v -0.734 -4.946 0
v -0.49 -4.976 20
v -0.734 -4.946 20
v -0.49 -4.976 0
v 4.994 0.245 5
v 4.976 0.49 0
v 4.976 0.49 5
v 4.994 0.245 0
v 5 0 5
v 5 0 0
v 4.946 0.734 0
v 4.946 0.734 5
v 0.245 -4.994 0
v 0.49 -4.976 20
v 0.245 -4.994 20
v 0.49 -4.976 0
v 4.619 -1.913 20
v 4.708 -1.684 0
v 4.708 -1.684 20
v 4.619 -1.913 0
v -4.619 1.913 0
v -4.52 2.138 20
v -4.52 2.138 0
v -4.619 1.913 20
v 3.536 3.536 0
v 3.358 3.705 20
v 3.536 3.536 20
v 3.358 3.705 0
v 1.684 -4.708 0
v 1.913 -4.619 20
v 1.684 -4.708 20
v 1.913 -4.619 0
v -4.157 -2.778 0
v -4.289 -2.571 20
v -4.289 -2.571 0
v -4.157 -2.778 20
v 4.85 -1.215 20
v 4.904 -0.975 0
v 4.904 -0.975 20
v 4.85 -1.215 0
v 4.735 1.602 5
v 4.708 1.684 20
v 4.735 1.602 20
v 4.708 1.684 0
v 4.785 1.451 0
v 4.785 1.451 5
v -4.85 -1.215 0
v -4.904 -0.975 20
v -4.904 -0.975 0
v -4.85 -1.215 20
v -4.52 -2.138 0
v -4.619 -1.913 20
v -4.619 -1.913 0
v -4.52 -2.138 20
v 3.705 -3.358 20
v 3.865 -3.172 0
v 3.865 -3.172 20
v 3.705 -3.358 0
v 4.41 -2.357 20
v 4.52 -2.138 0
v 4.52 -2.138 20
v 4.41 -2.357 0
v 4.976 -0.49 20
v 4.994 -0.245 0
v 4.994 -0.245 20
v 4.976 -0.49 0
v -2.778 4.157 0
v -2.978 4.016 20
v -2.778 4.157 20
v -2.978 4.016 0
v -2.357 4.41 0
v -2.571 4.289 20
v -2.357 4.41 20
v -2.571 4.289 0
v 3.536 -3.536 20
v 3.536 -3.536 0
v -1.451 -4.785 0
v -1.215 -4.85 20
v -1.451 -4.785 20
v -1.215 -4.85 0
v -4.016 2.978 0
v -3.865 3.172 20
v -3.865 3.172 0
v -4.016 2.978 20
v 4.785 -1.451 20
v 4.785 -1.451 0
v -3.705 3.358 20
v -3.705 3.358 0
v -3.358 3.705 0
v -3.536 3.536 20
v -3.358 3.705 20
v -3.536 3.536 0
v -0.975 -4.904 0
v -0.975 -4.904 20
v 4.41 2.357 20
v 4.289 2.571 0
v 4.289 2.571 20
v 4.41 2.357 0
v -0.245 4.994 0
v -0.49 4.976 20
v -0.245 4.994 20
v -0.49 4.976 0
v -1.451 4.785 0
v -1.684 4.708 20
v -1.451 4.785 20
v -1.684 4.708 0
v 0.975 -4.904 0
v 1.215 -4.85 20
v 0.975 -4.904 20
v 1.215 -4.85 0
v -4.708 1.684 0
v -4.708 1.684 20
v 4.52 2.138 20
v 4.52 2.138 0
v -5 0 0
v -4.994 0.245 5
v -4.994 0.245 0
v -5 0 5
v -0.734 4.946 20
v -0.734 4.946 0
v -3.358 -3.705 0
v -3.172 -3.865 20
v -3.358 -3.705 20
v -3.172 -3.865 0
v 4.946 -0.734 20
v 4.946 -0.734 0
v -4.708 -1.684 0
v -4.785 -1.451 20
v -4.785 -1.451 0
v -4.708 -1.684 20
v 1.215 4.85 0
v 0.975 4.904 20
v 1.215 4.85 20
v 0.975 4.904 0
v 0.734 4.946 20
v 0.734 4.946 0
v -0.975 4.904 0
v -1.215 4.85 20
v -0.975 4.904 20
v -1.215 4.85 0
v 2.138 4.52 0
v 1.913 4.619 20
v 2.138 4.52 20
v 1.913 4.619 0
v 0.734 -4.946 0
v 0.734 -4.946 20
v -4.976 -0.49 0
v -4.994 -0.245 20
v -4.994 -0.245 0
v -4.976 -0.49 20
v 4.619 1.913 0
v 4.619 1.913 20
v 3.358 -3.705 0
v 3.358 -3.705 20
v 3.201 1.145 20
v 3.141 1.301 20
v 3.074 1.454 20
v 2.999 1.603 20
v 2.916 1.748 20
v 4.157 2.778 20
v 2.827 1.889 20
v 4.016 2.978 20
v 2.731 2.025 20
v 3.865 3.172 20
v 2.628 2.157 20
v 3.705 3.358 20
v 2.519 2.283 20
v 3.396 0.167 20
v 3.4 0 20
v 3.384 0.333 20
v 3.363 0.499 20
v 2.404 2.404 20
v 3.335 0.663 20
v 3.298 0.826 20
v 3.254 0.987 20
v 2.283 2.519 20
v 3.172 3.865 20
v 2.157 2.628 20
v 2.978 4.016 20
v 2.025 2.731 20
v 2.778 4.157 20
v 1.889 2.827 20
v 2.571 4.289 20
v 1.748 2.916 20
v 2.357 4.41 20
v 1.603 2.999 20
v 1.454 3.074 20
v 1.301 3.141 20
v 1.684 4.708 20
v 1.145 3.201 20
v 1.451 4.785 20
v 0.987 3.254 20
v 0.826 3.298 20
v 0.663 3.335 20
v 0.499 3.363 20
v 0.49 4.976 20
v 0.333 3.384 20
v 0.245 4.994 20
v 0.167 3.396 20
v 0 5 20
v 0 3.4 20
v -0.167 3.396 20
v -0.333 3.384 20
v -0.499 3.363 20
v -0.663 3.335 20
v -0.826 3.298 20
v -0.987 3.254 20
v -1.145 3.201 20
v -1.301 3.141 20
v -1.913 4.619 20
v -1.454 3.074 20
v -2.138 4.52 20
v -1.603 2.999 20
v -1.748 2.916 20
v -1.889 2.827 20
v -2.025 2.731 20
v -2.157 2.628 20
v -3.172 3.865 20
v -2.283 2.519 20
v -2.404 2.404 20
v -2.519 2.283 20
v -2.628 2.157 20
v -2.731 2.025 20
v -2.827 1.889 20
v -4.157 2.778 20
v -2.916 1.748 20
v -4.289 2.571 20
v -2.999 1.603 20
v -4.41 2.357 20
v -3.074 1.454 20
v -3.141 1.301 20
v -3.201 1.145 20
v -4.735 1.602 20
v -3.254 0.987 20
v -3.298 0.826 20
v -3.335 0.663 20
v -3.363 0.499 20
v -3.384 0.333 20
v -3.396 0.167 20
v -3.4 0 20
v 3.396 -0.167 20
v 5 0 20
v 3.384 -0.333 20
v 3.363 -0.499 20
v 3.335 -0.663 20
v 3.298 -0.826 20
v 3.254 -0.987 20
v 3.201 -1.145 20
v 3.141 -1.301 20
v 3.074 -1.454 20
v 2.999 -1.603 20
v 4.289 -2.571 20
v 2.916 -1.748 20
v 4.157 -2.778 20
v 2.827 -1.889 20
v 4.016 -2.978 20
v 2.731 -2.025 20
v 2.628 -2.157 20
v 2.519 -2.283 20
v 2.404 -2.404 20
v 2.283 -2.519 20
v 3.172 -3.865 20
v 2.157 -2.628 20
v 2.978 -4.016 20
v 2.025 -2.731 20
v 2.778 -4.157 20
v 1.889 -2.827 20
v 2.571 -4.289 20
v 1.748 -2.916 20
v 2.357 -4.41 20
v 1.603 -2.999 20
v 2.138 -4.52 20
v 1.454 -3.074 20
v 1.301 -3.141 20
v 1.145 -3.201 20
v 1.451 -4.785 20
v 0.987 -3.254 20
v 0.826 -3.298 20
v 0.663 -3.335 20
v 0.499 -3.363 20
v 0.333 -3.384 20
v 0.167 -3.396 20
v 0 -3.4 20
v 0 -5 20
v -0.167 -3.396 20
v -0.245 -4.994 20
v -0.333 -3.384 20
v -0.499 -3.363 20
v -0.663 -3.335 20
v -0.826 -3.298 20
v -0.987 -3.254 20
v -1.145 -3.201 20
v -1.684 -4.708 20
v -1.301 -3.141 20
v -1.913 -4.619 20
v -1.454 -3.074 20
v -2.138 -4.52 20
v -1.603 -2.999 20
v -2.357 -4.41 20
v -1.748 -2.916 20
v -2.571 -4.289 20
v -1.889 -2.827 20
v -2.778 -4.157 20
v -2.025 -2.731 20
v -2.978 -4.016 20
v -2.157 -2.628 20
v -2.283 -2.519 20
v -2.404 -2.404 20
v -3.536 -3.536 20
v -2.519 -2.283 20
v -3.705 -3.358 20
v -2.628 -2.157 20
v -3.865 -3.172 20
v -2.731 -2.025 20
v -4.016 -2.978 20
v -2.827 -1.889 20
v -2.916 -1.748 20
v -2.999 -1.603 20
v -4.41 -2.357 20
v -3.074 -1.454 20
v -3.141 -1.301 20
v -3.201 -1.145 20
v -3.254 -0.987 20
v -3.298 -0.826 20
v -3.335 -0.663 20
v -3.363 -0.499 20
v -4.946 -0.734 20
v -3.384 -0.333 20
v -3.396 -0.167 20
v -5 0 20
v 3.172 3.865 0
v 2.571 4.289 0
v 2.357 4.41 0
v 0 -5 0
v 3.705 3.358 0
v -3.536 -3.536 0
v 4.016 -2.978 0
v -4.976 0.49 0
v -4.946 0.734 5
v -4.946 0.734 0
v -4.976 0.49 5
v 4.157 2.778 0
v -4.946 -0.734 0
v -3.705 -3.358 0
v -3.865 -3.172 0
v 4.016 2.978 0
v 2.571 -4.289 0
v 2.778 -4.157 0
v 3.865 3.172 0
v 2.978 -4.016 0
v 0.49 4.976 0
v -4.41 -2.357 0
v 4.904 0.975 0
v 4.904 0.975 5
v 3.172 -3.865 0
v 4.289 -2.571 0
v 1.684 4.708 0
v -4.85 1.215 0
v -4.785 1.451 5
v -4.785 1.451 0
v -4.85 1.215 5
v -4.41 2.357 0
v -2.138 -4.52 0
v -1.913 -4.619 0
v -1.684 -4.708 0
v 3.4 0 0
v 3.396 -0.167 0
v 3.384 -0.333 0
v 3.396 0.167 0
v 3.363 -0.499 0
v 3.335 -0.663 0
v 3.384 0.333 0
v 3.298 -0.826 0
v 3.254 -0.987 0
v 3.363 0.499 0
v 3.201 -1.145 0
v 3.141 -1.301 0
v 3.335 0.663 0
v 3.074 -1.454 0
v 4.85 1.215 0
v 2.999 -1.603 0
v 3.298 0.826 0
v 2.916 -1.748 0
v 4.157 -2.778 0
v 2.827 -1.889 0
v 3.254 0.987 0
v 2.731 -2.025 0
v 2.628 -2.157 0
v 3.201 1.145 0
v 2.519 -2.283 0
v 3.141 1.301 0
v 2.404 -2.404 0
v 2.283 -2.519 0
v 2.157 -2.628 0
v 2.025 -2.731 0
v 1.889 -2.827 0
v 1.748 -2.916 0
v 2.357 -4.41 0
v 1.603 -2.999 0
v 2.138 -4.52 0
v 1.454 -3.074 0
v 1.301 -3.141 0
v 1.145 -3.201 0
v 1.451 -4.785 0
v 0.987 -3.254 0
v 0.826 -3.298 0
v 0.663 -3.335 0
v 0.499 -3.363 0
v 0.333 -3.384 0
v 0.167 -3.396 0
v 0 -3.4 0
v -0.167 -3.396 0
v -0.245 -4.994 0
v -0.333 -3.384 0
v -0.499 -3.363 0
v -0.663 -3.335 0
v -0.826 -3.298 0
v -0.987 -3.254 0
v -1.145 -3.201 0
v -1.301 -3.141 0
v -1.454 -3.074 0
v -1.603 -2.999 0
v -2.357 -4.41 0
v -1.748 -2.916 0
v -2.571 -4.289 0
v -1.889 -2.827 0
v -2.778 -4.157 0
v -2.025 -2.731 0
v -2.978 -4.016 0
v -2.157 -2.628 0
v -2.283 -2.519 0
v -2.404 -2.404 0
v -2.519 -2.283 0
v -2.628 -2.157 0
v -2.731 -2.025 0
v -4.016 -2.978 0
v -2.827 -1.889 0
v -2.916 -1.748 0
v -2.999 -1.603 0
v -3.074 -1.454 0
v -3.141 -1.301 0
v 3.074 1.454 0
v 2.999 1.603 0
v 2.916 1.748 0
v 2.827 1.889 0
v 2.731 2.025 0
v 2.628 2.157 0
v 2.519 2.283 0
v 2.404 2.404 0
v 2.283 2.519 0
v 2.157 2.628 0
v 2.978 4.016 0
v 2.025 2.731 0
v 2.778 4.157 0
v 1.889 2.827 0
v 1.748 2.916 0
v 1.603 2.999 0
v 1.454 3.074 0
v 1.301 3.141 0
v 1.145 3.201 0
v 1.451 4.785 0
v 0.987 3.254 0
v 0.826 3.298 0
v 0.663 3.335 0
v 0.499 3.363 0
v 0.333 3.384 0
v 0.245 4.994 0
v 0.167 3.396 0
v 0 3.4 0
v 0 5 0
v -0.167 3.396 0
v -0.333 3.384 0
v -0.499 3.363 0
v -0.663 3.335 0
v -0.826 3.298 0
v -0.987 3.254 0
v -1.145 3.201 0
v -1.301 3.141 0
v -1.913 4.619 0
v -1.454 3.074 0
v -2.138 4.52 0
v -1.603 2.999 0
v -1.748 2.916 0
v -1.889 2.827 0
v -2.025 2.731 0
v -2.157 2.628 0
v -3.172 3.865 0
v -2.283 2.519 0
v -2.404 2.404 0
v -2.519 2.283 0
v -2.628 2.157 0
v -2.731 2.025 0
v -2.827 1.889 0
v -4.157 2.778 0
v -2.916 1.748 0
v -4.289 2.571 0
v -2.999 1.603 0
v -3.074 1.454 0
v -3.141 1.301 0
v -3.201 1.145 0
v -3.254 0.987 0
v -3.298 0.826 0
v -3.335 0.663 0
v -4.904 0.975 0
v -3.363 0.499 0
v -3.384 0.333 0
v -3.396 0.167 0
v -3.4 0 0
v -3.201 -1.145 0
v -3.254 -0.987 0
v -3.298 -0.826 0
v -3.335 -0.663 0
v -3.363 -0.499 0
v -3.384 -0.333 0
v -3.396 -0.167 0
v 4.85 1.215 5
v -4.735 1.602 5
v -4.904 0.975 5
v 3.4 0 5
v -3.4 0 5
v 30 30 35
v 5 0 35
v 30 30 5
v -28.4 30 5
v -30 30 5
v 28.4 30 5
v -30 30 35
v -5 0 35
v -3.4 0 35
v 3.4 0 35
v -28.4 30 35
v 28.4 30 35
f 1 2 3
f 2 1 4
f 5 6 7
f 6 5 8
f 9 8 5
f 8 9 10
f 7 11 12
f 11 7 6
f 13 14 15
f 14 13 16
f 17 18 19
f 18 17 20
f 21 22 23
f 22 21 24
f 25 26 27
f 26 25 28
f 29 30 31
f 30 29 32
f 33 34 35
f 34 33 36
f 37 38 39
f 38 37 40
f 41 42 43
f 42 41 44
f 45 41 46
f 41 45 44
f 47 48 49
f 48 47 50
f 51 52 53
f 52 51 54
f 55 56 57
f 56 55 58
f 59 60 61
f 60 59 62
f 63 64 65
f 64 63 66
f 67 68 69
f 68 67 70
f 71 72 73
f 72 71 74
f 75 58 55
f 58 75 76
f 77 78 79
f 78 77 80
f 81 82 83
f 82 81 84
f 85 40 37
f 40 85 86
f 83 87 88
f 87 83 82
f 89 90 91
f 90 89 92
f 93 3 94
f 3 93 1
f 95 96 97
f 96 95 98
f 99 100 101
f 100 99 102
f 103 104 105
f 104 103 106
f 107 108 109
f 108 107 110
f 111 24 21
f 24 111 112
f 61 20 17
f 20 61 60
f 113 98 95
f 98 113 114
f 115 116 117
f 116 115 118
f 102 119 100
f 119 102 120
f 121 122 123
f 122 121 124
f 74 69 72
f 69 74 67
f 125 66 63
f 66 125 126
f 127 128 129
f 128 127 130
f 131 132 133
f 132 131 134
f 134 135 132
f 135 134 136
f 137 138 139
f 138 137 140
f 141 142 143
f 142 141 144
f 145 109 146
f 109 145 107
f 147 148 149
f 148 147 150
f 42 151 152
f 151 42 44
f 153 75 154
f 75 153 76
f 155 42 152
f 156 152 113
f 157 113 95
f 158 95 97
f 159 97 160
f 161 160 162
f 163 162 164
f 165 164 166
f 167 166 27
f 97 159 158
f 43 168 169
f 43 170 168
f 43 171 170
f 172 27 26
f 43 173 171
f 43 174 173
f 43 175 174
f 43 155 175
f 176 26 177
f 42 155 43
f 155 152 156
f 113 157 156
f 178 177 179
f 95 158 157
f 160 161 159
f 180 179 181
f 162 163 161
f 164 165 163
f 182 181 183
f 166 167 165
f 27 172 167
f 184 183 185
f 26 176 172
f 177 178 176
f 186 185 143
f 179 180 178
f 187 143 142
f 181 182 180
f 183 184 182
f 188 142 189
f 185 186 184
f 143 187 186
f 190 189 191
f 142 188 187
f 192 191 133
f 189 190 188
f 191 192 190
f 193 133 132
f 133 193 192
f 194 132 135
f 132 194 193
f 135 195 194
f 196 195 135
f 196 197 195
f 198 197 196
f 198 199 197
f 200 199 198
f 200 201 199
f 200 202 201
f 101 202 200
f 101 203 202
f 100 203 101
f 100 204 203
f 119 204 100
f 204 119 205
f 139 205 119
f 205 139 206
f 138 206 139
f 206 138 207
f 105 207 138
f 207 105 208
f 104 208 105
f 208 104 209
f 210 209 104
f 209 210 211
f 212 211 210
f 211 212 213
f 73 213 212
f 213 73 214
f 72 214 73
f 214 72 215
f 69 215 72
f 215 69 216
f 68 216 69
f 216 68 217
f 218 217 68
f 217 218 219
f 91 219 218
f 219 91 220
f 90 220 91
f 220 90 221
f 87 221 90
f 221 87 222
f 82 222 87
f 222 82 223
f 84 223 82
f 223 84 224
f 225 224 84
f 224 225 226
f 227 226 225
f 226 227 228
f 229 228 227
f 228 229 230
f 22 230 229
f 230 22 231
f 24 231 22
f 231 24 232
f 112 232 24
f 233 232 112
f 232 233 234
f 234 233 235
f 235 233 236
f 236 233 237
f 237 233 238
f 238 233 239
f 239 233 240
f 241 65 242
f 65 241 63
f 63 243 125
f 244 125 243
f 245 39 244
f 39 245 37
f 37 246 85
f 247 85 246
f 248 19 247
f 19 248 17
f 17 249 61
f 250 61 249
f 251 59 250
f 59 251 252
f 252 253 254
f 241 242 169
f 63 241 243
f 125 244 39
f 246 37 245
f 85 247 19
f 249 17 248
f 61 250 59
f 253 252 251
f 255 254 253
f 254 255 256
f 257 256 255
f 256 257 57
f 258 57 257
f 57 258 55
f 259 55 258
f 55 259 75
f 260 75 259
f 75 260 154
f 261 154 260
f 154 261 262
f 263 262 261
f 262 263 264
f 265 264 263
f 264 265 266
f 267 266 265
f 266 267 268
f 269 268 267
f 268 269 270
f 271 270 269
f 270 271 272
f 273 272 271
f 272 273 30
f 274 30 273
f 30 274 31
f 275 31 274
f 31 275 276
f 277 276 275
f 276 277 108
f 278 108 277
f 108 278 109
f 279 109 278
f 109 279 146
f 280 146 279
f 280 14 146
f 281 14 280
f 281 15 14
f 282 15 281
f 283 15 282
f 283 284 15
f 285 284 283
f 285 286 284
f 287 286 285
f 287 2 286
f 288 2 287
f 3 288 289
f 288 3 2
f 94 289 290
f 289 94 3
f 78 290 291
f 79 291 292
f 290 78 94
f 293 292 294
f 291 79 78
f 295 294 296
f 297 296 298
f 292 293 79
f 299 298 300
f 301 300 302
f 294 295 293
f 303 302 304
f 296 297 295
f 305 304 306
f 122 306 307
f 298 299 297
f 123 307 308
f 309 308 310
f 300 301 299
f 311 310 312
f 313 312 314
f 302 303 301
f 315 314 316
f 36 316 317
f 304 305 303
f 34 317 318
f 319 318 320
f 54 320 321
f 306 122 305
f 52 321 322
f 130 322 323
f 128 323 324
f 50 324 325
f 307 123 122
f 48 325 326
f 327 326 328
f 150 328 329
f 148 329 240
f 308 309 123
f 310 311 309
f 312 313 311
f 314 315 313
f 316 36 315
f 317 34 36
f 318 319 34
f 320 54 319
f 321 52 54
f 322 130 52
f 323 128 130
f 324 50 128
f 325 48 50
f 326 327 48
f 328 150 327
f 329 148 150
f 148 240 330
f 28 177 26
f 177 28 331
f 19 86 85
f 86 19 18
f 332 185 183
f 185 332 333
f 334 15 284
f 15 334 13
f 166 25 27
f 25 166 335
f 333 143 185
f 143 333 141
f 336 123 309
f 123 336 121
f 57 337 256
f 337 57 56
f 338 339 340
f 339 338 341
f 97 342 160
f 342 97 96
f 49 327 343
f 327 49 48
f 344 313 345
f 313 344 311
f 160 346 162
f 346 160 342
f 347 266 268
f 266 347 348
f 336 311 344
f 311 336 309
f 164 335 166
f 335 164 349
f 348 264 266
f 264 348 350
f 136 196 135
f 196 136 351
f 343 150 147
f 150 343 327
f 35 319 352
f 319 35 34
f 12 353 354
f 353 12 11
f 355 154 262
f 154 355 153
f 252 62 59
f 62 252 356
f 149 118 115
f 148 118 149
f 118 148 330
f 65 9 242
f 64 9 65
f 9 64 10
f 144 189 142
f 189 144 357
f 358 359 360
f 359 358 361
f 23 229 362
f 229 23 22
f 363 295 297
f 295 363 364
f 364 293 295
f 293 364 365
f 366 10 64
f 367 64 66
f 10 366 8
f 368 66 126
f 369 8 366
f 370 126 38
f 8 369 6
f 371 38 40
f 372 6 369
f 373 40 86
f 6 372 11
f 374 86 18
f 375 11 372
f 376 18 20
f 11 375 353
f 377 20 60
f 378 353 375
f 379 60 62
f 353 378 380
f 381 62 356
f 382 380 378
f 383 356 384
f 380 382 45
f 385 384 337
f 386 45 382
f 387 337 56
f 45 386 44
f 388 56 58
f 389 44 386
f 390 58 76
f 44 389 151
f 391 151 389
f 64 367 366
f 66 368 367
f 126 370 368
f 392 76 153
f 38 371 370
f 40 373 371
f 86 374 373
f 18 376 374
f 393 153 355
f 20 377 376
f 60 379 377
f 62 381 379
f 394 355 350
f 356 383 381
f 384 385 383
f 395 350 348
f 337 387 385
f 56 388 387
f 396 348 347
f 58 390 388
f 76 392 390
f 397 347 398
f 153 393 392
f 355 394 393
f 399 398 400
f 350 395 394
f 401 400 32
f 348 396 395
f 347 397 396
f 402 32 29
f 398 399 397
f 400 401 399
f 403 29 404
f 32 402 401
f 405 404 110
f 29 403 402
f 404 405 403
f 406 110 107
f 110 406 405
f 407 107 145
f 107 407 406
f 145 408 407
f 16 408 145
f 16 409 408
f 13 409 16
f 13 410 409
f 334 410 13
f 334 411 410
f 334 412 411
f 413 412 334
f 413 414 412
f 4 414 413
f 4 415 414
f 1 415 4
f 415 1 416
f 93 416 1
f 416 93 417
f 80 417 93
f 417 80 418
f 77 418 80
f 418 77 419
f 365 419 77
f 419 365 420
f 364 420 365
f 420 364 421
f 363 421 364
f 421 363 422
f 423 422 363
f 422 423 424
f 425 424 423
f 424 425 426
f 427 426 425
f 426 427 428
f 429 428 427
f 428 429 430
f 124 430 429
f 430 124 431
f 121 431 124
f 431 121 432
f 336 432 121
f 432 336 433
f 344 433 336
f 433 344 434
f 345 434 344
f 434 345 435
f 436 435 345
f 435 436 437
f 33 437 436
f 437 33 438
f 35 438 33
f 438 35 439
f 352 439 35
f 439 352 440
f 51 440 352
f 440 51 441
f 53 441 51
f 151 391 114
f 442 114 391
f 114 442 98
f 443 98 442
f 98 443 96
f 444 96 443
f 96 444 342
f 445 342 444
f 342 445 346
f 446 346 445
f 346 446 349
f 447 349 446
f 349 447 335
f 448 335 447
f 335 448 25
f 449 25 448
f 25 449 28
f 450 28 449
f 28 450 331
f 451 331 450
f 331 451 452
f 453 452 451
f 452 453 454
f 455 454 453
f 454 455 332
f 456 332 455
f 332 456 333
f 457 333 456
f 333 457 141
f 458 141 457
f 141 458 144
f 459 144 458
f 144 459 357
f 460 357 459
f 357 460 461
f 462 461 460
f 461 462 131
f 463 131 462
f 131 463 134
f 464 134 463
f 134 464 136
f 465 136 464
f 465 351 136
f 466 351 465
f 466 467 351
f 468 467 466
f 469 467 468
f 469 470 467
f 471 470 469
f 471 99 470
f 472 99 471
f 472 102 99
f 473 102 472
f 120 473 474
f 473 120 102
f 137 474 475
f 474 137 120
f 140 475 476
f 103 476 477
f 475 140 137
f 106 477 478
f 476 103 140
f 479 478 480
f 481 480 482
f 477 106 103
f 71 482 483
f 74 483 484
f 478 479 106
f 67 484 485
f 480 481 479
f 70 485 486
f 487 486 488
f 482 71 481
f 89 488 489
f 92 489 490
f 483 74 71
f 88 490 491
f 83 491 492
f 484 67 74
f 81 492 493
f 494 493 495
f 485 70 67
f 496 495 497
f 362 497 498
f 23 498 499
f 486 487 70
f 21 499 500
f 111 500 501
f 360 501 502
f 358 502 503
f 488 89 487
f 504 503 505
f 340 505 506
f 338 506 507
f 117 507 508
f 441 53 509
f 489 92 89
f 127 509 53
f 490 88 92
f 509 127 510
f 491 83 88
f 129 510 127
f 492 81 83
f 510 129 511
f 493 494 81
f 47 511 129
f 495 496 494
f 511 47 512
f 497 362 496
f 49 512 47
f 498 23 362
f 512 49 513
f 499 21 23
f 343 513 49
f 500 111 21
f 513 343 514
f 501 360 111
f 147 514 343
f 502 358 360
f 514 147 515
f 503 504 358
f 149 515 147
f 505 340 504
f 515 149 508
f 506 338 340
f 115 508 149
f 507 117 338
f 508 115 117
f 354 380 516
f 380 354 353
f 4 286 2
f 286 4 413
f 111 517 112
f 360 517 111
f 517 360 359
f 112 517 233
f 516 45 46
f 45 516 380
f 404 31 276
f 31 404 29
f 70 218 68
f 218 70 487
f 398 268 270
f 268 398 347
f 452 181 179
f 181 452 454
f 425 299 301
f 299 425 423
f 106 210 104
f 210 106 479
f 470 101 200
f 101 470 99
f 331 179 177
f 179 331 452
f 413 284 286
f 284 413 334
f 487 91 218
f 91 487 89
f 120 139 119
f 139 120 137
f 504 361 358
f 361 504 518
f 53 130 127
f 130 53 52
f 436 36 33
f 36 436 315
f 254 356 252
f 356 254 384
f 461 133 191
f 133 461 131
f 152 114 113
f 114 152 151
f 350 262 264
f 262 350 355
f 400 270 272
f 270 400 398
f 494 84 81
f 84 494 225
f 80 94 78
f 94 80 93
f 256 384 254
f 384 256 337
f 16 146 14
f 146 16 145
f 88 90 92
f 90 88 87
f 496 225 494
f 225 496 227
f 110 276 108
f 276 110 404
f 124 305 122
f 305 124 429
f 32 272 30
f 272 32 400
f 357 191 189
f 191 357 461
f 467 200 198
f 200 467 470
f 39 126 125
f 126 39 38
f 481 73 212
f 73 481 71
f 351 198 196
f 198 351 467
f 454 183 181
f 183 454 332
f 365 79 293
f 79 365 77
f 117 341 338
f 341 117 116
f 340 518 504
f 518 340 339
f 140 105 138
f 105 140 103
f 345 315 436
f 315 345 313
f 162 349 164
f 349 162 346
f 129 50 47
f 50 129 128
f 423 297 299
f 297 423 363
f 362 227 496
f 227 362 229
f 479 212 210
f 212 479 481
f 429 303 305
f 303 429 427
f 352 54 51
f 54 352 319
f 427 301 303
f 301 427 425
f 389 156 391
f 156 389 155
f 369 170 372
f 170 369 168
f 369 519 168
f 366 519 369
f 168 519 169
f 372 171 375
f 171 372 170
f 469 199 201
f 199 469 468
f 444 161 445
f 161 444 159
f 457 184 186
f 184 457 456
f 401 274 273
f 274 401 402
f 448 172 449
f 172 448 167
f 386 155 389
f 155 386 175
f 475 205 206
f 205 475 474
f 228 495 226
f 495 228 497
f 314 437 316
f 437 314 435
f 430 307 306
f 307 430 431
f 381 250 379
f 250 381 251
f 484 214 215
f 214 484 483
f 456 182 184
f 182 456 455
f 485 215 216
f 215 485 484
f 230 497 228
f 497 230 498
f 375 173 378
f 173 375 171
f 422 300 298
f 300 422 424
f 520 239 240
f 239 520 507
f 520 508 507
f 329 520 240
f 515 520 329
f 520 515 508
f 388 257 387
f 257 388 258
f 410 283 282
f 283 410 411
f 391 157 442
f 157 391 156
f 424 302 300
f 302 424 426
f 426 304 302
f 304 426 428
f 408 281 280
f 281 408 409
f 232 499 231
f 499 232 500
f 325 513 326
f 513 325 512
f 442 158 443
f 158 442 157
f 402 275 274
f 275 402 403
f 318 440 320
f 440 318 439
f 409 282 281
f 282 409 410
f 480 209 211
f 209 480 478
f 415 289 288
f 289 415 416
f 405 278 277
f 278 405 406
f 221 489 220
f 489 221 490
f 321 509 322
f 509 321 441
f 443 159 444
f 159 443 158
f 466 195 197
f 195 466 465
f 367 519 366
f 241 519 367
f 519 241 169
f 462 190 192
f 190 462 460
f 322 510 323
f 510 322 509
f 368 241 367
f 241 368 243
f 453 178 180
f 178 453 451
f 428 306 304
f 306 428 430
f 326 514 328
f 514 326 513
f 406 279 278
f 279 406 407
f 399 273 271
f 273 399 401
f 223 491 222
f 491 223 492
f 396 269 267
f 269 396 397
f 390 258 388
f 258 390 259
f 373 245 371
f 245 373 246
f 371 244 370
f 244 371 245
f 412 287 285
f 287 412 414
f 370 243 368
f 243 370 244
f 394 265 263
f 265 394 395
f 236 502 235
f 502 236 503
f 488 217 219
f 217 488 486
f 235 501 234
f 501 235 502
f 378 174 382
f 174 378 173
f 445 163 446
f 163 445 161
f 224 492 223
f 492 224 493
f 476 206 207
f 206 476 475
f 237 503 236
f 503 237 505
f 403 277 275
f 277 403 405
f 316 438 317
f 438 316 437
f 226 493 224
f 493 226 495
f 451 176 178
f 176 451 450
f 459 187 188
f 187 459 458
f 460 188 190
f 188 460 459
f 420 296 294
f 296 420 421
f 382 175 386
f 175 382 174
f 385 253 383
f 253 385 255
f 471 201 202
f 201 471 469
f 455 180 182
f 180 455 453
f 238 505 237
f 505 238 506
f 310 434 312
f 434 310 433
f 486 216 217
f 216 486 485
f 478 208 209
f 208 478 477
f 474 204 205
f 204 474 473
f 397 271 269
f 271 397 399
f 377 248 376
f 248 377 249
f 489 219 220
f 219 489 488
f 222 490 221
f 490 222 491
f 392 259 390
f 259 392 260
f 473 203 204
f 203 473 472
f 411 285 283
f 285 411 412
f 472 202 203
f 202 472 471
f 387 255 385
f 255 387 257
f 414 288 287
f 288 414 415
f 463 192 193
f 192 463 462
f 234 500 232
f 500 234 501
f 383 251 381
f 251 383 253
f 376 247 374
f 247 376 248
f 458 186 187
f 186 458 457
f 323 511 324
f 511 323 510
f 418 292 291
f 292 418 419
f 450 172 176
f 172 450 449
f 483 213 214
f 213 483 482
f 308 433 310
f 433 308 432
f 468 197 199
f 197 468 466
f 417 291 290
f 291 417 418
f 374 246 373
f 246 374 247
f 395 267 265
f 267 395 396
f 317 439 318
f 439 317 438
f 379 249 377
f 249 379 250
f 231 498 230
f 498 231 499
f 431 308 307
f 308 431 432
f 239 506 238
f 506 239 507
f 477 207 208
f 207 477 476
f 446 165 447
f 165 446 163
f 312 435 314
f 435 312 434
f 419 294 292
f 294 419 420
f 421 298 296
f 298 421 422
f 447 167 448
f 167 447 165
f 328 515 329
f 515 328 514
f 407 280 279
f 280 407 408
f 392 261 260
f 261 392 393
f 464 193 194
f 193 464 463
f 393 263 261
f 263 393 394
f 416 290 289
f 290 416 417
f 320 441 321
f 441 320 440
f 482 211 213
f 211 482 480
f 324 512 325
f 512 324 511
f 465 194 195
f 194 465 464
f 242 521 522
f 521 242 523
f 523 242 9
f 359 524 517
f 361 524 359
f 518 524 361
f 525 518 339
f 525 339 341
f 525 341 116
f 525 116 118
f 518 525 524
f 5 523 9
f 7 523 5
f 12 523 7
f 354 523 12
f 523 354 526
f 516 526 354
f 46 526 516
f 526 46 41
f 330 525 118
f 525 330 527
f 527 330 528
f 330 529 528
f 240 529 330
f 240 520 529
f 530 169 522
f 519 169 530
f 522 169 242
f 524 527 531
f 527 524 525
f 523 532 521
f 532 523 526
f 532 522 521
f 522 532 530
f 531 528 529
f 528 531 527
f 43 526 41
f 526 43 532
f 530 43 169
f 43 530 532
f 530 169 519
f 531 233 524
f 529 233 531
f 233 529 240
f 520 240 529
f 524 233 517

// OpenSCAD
// Lab Funnel Design
// Units: millimetres
// Orientation: Upright, wide opening at top, resting on XY plane at z=0.

// Dimensions
$fn = 128; // High resolution for smooth curves

// Spout (Tube)
spout_outer_diameter = 10;
spout_inner_diameter = 6.8; // 10 - 2*1.6
spout_length = 20;
spout_wall_thickness = 1.6;

// Cone (Funnel)
cone_bottom_diameter = 10; // Matches spout outer diameter
cone_top_diameter = 60;
cone_bottom_z = 20; // Start of cone
cone_top_z = 50;    // End of cone (rim)
cone_wall_thickness = 1.6;

// Calculated Cone Dimensions
cone_bottom_radius = cone_bottom_diameter / 2;
cone_top_radius = cone_top_diameter / 2;
cone_height = cone_top_z - cone_bottom_z;

// Main Body Construction
// We build the solid from the bottom up.
// 1. The Spout: A hollow cylinder from z=0 to z=20.
// 2. The Cone: A hollow frustum from z=20 to z=50.
// We use a single union of two hollow shapes to ensure continuity.

// Helper function to create a hollow cylinder (spout)
module hollow_cylinder(outer_d, inner_d, height, z_start) {
    translate([0, 0, z_start]) {
        difference() {
            // Outer shell
            cylinder(h = height, d = outer_d, center = [0, 0, height/2]);
            // Inner hole
            cylinder(h = height, d = inner_d, center = [0, 0, height/2]);
        }
    }
}

// Helper function to create a hollow cone (frustum)
// z_start is the Z coordinate of the bottom of the cone
module hollow_cone(outer_bottom_d, outer_top_d, inner_bottom_d, inner_top_d, height, z_start) {
    translate([0, 0, z_start]) {
        difference() {
            // Outer shell
            linear_extrude(height = height, center = true) {
                polygon(points = [
                    [-outer_bottom_d/2, 0],
                    [outer_bottom_d/2, 0],
                    [outer_top_d/2, height],
                    [-outer_top_d/2, height]
                ]);
            }
            // Inner hole
            linear_extrude(height = height, center = true) {
                polygon(points = [
                    [-inner_bottom_d/2, 0],
                    [inner_bottom_d/2, 0],
                    [inner_top_d/2, height],
                    [-inner_top_d/2, height]
                ]);
            }
        }
    }
}

// Build the part
union() {
    // 1. The Spout (z=0 to z=20)
    hollow_cylinder(
        outer_d = spout_outer_diameter,
        inner_d = spout_inner_diameter,
        height = spout_length,
        z_start = 0
    );

    // 2. The Cone (z=20 to z=50)
    hollow_cone(
        outer_bottom_d = cone_bottom_diameter,
        outer_top_d = cone_top_diameter,
        inner_bottom_d = spout_inner_diameter, // Continuity with spout bore
        inner_top_d = cone_top_diameter - (2 * cone_wall_thickness), // Top rim thickness
        height = cone_height,
        z_start = cone_bottom_z
    );
}
